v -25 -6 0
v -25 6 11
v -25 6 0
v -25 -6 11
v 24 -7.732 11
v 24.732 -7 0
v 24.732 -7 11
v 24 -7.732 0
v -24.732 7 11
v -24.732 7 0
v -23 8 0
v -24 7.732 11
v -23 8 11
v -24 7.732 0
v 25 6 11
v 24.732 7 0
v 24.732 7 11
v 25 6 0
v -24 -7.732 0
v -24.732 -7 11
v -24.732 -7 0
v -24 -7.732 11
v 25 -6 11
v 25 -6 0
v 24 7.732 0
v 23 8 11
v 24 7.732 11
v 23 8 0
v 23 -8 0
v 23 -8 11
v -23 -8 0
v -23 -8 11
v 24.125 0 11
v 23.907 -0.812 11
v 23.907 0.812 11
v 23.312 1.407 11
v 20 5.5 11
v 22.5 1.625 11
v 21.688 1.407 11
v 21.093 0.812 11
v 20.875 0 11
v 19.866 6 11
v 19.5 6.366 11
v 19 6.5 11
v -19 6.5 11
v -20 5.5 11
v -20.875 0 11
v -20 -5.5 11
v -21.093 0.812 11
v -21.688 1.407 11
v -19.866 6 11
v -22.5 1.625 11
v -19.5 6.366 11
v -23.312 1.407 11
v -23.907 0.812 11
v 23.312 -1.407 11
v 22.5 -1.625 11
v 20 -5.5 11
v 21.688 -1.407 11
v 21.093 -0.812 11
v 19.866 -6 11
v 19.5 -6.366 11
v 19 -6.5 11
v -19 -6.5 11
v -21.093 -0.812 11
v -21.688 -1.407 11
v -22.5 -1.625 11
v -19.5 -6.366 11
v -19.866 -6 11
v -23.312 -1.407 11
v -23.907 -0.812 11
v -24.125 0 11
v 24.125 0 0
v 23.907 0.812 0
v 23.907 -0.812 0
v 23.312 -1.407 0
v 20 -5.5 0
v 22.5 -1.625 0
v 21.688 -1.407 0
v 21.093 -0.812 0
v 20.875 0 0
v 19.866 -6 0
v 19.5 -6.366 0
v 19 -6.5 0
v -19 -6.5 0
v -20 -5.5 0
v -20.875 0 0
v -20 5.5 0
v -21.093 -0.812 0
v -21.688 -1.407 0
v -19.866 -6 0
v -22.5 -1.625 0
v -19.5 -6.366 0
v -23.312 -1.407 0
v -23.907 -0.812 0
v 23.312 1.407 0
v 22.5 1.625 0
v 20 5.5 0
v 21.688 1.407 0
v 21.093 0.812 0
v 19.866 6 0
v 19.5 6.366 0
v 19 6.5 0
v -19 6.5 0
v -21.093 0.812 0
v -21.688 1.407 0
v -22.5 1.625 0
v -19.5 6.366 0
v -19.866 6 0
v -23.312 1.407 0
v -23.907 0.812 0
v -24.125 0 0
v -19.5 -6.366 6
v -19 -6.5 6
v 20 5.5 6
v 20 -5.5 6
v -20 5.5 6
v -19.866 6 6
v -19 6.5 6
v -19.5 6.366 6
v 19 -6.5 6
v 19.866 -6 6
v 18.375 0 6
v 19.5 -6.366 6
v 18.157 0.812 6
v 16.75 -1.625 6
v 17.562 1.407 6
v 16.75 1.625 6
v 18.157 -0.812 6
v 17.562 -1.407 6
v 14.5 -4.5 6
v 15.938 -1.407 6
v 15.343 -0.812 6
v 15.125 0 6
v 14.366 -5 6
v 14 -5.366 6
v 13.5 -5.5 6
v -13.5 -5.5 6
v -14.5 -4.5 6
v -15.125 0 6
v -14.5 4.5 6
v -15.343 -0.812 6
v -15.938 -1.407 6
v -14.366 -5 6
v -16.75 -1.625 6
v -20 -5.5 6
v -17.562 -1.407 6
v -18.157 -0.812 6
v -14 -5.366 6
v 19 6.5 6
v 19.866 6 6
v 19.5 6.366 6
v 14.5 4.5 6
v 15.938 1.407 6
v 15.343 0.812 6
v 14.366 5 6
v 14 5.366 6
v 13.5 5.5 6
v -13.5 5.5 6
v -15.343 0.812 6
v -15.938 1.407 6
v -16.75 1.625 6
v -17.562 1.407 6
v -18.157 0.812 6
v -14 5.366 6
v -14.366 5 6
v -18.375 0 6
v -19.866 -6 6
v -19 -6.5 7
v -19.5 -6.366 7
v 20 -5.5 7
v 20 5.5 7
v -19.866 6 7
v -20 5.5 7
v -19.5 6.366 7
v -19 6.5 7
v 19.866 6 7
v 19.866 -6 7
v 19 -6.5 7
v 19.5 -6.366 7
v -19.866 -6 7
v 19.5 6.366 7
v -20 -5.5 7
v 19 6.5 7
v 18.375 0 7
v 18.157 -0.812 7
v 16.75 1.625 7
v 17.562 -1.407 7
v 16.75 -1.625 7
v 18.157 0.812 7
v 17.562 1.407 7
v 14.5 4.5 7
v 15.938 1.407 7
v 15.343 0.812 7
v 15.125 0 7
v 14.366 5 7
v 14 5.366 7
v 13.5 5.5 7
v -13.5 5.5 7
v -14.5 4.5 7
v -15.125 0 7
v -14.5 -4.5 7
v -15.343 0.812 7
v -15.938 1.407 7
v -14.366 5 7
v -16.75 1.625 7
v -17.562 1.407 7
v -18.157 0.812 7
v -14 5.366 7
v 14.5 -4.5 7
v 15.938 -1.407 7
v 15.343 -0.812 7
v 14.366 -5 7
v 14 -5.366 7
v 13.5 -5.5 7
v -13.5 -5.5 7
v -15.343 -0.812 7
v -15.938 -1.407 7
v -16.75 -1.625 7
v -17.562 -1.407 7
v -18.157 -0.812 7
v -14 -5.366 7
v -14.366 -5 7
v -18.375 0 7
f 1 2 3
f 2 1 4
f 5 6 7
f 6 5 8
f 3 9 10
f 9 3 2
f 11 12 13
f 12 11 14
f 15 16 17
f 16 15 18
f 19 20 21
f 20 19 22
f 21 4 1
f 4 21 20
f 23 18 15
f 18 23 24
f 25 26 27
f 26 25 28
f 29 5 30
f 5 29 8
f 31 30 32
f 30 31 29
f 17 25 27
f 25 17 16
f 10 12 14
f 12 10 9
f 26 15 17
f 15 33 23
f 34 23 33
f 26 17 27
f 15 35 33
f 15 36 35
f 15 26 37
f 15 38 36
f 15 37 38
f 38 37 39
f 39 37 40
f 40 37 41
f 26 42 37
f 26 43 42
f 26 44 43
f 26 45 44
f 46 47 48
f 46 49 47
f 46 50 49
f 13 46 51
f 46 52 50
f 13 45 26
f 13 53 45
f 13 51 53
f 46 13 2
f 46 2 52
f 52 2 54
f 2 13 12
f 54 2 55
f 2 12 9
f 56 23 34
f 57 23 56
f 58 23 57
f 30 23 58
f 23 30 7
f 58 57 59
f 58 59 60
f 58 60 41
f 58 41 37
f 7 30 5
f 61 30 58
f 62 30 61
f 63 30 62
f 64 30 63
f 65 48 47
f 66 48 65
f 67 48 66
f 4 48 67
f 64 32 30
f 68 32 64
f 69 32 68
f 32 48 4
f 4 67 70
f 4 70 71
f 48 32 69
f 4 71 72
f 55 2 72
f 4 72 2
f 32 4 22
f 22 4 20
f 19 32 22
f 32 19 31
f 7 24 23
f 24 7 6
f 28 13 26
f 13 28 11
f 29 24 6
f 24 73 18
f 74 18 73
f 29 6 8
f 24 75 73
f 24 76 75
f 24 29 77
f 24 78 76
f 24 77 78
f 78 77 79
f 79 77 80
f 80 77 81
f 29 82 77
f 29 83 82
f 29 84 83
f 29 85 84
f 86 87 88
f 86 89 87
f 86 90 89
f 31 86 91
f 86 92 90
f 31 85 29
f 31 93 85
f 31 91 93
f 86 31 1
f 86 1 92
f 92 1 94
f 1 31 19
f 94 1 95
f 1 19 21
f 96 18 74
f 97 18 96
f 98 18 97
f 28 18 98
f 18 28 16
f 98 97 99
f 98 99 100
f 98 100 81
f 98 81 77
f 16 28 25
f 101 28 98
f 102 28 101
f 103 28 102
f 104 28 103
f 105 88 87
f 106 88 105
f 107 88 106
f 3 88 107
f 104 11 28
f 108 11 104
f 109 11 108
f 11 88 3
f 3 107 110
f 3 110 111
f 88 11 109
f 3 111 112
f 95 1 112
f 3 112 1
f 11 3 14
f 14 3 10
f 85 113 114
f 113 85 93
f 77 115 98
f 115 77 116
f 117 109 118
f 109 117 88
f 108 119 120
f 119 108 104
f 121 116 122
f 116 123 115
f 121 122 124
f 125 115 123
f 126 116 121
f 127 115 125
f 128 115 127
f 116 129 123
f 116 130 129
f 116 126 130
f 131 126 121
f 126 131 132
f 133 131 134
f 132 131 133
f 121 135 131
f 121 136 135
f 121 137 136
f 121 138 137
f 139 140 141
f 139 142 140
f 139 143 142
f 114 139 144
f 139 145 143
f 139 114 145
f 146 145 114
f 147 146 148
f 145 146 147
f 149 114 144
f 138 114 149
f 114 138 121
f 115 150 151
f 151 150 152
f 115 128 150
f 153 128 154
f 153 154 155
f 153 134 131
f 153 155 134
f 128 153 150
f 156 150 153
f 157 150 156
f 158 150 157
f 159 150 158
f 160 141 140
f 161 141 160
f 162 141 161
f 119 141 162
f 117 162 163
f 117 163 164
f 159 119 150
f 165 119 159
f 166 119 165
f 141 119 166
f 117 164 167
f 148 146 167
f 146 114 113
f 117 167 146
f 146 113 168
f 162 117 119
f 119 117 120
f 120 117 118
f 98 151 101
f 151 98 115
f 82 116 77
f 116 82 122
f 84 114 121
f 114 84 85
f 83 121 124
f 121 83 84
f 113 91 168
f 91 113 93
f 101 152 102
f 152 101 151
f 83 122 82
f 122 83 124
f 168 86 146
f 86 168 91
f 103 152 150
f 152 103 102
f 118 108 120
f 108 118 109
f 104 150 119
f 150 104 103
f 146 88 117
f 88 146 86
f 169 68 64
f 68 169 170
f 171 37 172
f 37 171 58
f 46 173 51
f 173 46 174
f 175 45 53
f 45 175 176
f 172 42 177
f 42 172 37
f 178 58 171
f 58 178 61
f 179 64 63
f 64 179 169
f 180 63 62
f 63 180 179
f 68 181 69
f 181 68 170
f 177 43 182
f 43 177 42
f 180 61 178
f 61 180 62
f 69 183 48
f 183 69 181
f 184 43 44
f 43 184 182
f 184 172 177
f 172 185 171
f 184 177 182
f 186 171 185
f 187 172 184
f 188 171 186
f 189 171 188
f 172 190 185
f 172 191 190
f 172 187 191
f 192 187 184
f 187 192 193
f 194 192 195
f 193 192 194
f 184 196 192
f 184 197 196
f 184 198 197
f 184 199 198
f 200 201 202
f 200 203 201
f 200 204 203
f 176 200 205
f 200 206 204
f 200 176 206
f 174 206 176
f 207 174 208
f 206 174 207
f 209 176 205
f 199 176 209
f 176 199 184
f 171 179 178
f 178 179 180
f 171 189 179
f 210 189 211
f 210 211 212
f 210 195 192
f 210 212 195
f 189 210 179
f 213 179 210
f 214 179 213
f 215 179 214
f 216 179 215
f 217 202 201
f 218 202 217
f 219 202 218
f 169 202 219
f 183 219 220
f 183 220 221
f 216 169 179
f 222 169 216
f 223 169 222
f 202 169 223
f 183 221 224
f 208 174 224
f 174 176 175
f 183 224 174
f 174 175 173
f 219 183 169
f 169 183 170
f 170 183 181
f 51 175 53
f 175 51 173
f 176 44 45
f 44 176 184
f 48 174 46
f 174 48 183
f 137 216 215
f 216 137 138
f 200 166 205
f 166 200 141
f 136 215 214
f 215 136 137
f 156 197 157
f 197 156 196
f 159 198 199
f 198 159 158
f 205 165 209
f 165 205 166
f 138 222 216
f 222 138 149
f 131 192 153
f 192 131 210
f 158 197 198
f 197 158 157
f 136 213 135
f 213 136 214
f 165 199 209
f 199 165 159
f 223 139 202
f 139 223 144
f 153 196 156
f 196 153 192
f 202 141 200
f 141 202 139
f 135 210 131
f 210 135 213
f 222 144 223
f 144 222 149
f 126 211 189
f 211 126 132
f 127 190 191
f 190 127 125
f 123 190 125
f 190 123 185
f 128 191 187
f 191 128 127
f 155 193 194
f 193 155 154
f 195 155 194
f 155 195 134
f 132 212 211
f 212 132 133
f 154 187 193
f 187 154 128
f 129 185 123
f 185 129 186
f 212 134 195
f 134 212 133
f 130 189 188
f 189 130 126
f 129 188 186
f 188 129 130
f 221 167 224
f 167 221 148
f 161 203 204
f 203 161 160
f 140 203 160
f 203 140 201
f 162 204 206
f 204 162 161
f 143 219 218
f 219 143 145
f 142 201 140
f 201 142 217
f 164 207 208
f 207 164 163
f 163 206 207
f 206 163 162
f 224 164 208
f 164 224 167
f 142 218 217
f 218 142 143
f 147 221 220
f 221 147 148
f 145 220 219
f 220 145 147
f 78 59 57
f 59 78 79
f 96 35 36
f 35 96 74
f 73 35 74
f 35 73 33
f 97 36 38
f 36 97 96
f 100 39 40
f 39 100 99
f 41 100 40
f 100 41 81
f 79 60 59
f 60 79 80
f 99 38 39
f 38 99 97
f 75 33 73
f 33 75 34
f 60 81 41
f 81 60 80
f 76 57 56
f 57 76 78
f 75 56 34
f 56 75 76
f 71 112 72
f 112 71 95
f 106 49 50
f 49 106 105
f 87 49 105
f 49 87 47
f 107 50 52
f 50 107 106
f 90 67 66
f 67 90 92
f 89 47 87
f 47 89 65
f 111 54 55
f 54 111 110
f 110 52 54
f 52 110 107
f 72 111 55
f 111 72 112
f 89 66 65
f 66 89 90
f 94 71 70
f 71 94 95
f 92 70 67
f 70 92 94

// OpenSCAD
// file: ../OpenSCAD_Modules/cube_vround.scad
module cube_vround(
	size=[10,10,10],
	round_corners=[true,true,true,true],
	rounding=3,
	center_xy=false,
	center_z=false,
	attach=0,
	wall_attach=0,
	quality=2, //integer from 1 to infinity
)
{
	assert(len(size)==3);
	assert(len(round_corners)==4);
	assert(rounding>0);
	assert(rounding<=size[0]/2);
	assert(rounding<=size[1]/2);
	assert(quality>0);
	assert(attach>=0);
	assert(wall_attach>=0);
	height=size[2]+attach;
	cyl_r=rounding+wall_attach;
	cyl_mvx=size[0]/2-rounding;
	cyl_mvy=size[1]/2-rounding;
	cube_szx=size[0]/2;
	cube_szy=size[1]/2;
	cube_mvx=cube_szx/2+wall_attach;
	cube_mvy=cube_szy/2+wall_attach;
	translate([center_xy?0:cube_szx,center_xy?0:cube_szy,center_z?-attach/2:(size[2]-attach)/2])
		hull()
		{
			if(round_corners[0])
				translate([cyl_mvx,cyl_mvy])
					cylinder(r=cyl_r,h=height,$fn=12*quality,center=true);
			else
				translate([cube_mvx,cube_mvy])
					cube([cube_szx,cube_szy,height],center=true);
			if(round_corners[1])
				translate([cyl_mvx,-cyl_mvy])
					cylinder(r=cyl_r,h=height,$fn=12*quality,center=true);
			else
				translate([cube_mvx,-cube_mvy])
					cube([cube_szx,cube_szy,height],center=true);
			if(round_corners[2])
				translate([-cyl_mvx,-cyl_mvy])
					cylinder(r=cyl_r,h=height,$fn=12*quality,center=true);
			else
				translate([-cube_mvx,-cube_mvy])
					cube([cube_szx,cube_szy,height],center=true);
			if(round_corners[3])
				translate([-cyl_mvx,cyl_mvy])
					cylinder(r=cyl_r,h=height,$fn=12*quality,center=true);
			else
				translate([-cube_mvx,cube_mvy])
					cube([cube_szx,cube_szy,height],center=true);
		};
}

//example
cube_vround(round_corners=[true,false,true,false],
size=[10,20,6],
attach=0.1,
wall_attach=0.1,
rounding=3,
center_xy=true,center_z=false);
// main file
use <../OpenSCAD_Modules/cube_vround.scad>


module AuxConnectorHolder
(
	screwDiam=3.25,
	holderSize=[50,16,11],
	iCutSize=[29,11,1],
	eCutSize=[40,13,6],
	iScrewDiff=33.5,
	eScrewDiff=45,
	quality=1,
)
{
	cutClr=0.1;
	topCutHeight=holderSize[2]-eCutSize[2]-iCutSize[2];
	difference()
	{
		cube_vround(size=[holderSize[0],holderSize[1],holderSize[2]],rounding=2,center_xy=true,quality=quality);
		translate([0,0,-cutClr])
			cube_vround(size=[eCutSize[0],eCutSize[1],eCutSize[2]+cutClr],rounding=1,center_xy=true,quality=quality);
		translate([0,0,holderSize[2]-topCutHeight])
			cube_vround(size=[eCutSize[0],eCutSize[1],topCutHeight+cutClr],rounding=1,center_xy=true,quality=quality);
		cube_vround(size=[iCutSize[0],iCutSize[1],holderSize[2]],rounding=1,center_xy=true,quality=quality);
		translate([iScrewDiff/2,0,0])
			cylinder(d=screwDiam,h=holderSize[2],$fn=quality*12);
		translate([-iScrewDiff/2,0,0])
			cylinder(d=screwDiam,h=holderSize[2],$fn=quality*12);
		translate([eScrewDiff/2,0,-cutClr])
			cylinder(d=screwDiam,h=holderSize[2]+2*cutClr,$fn=quality*12);
		translate([-eScrewDiff/2,0,-cutClr])
			cylinder(d=screwDiam,h=holderSize[2]+2*cutClr,$fn=quality*12);
	}
	color(c=[0,0,0])
	{

	}
}

AuxConnectorHolder();
